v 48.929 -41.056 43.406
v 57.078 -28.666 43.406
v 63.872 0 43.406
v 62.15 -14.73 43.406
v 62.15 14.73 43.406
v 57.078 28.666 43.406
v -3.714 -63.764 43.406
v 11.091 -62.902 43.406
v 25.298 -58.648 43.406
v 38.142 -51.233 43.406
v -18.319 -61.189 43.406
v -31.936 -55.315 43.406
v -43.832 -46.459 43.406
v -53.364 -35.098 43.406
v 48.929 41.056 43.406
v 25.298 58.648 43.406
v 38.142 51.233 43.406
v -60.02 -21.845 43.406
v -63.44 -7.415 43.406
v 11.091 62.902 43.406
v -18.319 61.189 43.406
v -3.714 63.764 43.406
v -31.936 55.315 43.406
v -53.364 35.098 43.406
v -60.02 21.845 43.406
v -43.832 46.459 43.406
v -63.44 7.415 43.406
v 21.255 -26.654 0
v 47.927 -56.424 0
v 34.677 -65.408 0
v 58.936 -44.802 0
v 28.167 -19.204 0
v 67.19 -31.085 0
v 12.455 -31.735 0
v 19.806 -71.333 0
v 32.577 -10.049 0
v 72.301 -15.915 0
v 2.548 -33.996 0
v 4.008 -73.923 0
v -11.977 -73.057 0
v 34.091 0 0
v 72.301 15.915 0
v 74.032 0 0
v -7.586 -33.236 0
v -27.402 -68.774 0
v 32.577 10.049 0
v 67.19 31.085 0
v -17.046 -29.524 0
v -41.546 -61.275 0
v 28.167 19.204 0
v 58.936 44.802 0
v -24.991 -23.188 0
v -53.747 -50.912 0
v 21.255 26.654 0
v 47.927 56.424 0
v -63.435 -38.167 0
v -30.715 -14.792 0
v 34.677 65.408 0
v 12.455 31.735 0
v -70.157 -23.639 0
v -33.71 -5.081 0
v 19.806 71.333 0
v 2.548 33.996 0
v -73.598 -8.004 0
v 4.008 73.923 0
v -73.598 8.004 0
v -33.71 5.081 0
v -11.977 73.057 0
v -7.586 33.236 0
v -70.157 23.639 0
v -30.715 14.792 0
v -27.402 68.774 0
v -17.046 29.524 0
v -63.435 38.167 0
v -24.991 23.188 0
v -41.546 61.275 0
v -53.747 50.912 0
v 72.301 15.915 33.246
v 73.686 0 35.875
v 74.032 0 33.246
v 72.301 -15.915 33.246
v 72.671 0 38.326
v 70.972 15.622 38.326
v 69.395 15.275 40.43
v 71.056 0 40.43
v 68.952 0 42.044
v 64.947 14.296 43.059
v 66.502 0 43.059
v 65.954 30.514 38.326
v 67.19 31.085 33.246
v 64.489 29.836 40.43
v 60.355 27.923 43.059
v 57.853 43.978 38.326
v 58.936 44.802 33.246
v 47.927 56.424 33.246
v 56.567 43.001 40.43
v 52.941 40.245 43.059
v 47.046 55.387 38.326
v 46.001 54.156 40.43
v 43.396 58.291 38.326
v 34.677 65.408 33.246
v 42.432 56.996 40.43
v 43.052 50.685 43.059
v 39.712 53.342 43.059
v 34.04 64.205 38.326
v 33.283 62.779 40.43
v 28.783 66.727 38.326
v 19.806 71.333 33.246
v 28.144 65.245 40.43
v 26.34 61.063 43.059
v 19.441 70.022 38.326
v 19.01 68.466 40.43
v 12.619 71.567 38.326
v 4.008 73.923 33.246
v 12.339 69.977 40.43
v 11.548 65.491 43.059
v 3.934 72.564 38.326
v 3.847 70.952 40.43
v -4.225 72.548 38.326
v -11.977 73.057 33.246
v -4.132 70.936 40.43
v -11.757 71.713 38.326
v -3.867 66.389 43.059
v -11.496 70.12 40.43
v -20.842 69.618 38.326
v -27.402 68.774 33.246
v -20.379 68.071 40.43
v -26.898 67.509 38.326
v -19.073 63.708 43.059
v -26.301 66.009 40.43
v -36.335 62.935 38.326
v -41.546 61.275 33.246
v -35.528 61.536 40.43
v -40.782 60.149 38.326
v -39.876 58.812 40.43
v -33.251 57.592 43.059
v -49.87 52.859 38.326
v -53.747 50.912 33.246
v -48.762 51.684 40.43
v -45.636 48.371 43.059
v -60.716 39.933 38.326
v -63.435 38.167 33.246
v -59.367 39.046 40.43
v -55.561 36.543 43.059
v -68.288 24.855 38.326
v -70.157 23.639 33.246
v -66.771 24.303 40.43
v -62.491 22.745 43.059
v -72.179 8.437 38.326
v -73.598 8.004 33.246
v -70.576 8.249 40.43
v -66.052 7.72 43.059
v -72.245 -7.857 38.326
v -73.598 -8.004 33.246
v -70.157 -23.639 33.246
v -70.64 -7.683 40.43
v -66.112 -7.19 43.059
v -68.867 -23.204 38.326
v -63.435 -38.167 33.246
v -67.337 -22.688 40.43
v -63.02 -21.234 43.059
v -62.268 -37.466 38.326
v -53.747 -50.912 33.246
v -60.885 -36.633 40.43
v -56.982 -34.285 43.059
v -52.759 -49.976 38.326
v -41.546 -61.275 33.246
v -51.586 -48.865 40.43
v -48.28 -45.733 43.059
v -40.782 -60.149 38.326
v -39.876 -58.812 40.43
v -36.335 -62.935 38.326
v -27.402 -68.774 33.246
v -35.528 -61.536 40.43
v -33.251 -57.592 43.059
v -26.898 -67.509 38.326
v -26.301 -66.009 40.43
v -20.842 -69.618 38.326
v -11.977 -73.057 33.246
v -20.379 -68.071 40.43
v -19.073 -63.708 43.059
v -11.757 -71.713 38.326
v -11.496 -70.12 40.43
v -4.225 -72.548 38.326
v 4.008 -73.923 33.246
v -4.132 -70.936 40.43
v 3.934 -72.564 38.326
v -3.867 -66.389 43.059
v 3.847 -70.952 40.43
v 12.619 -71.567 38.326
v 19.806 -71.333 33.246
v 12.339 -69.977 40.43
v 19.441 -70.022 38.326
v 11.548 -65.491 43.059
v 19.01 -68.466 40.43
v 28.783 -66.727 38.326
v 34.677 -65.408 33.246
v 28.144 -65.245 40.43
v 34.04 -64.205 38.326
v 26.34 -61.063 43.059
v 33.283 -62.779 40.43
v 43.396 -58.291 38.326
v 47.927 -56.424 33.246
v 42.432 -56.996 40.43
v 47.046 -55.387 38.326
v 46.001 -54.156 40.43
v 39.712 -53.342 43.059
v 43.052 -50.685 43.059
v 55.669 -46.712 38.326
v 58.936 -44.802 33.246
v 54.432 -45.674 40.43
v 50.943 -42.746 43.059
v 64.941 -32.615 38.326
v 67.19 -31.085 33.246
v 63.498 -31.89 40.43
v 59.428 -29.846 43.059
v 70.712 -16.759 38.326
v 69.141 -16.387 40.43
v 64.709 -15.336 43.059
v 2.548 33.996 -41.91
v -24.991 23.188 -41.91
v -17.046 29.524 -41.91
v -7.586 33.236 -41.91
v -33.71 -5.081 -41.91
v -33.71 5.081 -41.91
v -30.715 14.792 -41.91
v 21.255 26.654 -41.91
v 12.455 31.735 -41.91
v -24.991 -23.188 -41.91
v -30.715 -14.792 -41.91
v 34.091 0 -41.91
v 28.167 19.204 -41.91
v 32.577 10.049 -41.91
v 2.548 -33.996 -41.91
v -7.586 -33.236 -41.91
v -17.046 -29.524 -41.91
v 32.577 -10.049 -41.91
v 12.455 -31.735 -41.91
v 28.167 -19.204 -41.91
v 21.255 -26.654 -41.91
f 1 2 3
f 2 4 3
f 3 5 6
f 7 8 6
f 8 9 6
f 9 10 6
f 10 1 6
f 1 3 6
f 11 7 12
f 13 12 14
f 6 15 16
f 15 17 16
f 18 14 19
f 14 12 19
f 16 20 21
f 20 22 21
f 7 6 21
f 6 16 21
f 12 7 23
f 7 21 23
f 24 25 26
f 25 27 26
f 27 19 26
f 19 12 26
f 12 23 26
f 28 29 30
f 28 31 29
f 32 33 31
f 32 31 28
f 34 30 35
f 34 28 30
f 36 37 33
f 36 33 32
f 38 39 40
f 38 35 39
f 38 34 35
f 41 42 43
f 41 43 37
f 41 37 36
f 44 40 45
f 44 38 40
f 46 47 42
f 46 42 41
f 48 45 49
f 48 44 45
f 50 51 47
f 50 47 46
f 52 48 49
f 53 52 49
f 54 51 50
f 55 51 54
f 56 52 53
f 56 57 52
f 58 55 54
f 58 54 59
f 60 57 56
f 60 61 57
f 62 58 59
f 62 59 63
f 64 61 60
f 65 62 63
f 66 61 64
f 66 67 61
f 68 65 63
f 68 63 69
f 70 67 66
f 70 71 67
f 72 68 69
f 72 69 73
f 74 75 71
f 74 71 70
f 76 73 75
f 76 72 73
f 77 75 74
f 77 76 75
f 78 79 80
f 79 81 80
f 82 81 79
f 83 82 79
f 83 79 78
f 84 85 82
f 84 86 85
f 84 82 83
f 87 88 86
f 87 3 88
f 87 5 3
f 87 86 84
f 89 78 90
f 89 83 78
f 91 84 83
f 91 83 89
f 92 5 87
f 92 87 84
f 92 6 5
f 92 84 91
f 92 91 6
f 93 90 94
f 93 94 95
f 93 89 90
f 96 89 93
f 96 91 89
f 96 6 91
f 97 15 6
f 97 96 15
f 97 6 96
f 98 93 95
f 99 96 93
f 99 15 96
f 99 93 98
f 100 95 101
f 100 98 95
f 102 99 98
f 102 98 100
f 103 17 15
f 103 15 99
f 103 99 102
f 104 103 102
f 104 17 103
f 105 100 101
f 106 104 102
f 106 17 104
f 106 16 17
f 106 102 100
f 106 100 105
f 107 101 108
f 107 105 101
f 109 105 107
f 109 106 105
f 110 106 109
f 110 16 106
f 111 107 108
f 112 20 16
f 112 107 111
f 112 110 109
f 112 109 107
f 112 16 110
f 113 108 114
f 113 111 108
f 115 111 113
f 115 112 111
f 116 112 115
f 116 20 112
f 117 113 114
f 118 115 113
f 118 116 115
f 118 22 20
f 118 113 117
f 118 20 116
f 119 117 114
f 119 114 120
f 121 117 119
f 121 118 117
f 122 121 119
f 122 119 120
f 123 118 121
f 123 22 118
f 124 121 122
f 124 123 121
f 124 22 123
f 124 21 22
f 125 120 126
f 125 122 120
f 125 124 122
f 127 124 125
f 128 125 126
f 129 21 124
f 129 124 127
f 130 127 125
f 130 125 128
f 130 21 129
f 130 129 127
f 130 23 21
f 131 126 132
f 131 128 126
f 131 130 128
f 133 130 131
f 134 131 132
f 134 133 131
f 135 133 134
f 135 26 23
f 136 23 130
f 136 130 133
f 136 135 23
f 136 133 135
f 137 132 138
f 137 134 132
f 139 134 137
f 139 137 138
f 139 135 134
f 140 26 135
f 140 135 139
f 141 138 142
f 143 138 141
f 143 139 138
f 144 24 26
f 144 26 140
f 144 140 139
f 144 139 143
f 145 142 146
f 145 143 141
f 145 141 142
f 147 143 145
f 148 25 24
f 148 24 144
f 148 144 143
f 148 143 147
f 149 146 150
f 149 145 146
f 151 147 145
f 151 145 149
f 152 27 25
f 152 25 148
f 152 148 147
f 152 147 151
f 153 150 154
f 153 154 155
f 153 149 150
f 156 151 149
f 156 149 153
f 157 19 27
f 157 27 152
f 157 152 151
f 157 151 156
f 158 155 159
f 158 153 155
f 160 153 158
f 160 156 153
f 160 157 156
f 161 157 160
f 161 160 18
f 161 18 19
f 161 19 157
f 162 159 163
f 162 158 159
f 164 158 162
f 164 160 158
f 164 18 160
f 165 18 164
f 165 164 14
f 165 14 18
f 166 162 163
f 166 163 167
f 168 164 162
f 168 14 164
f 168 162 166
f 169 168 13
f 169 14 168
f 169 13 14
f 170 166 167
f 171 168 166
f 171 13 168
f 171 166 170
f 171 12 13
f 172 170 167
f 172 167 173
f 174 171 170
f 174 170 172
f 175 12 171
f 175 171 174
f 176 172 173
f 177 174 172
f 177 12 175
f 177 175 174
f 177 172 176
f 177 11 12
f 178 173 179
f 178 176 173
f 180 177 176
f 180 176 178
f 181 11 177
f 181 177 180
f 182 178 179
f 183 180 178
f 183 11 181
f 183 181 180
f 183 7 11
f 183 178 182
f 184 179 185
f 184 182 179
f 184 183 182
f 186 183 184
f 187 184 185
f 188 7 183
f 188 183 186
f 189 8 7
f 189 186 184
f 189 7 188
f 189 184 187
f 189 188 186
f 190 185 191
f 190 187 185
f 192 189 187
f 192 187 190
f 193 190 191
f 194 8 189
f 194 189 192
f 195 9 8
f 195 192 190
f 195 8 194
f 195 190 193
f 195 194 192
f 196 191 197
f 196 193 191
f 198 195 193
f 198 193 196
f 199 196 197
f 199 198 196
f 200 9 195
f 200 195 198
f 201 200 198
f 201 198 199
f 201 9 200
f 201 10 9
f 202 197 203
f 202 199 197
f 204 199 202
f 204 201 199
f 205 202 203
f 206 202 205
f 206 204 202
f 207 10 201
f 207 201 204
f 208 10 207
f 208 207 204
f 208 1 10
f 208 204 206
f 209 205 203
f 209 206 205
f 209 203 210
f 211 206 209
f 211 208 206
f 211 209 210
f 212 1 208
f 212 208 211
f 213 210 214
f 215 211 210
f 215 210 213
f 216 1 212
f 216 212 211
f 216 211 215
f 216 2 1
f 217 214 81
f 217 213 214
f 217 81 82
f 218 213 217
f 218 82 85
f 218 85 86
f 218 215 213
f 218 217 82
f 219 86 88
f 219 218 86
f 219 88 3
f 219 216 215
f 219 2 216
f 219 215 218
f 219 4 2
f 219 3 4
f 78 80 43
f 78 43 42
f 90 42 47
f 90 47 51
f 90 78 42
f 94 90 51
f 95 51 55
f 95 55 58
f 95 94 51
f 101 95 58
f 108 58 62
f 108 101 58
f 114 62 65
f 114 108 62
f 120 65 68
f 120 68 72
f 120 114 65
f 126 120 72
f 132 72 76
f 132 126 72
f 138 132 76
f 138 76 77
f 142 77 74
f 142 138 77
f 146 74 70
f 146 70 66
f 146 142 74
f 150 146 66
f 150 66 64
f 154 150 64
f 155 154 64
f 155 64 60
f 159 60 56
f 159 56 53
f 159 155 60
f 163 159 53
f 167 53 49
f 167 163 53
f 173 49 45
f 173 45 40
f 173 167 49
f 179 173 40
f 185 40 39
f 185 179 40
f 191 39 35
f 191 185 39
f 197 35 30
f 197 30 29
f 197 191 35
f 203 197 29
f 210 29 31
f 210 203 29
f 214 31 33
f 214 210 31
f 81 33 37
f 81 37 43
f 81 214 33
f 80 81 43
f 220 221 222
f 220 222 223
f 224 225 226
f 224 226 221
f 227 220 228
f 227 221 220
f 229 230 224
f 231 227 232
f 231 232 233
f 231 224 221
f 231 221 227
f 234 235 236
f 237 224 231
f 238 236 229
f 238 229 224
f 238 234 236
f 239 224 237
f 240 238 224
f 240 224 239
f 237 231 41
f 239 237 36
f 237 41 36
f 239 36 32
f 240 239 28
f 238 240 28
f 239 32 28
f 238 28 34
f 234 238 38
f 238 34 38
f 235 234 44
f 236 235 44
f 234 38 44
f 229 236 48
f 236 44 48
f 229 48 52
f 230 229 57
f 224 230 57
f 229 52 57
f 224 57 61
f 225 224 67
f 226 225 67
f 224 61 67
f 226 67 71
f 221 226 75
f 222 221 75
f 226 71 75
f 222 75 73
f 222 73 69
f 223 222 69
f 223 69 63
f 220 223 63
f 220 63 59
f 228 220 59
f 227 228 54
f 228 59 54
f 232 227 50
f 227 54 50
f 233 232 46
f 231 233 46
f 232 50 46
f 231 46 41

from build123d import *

# Parameters (mm, degrees)
F0_W     = 74.031934
F0_H     = 43.405589
F2_R     = 34.091138
F3_DEPTH = 41.91
F4_R     = 10.16


with BuildPart() as f1:
    # F0 (on Front) → F1 (revolve)
    with BuildSketch(Plane.XZ):
        with Locations((37.015967, 21.702794)):
            Rectangle(F0_W, F0_H)
    revolve(axis=Axis((0, 0, 21.702794), (0, 0, 1)))

    # F2 (on face) → F3 (join)
    with BuildSketch(Plane(origin=(0, 0, 0), x_dir=(1, 0, 0), z_dir=(0, 0, -1))):
        Circle(F2_R)
    extrude(amount=F3_DEPTH)

    # F4
    f4_edges = [f1.edges().sort_by_distance(p)[0] for p in [
        (-74.031934, 0, 43.405589),
    ]]
    fillet(f4_edges, radius=F4_R)


solid = f1.part
